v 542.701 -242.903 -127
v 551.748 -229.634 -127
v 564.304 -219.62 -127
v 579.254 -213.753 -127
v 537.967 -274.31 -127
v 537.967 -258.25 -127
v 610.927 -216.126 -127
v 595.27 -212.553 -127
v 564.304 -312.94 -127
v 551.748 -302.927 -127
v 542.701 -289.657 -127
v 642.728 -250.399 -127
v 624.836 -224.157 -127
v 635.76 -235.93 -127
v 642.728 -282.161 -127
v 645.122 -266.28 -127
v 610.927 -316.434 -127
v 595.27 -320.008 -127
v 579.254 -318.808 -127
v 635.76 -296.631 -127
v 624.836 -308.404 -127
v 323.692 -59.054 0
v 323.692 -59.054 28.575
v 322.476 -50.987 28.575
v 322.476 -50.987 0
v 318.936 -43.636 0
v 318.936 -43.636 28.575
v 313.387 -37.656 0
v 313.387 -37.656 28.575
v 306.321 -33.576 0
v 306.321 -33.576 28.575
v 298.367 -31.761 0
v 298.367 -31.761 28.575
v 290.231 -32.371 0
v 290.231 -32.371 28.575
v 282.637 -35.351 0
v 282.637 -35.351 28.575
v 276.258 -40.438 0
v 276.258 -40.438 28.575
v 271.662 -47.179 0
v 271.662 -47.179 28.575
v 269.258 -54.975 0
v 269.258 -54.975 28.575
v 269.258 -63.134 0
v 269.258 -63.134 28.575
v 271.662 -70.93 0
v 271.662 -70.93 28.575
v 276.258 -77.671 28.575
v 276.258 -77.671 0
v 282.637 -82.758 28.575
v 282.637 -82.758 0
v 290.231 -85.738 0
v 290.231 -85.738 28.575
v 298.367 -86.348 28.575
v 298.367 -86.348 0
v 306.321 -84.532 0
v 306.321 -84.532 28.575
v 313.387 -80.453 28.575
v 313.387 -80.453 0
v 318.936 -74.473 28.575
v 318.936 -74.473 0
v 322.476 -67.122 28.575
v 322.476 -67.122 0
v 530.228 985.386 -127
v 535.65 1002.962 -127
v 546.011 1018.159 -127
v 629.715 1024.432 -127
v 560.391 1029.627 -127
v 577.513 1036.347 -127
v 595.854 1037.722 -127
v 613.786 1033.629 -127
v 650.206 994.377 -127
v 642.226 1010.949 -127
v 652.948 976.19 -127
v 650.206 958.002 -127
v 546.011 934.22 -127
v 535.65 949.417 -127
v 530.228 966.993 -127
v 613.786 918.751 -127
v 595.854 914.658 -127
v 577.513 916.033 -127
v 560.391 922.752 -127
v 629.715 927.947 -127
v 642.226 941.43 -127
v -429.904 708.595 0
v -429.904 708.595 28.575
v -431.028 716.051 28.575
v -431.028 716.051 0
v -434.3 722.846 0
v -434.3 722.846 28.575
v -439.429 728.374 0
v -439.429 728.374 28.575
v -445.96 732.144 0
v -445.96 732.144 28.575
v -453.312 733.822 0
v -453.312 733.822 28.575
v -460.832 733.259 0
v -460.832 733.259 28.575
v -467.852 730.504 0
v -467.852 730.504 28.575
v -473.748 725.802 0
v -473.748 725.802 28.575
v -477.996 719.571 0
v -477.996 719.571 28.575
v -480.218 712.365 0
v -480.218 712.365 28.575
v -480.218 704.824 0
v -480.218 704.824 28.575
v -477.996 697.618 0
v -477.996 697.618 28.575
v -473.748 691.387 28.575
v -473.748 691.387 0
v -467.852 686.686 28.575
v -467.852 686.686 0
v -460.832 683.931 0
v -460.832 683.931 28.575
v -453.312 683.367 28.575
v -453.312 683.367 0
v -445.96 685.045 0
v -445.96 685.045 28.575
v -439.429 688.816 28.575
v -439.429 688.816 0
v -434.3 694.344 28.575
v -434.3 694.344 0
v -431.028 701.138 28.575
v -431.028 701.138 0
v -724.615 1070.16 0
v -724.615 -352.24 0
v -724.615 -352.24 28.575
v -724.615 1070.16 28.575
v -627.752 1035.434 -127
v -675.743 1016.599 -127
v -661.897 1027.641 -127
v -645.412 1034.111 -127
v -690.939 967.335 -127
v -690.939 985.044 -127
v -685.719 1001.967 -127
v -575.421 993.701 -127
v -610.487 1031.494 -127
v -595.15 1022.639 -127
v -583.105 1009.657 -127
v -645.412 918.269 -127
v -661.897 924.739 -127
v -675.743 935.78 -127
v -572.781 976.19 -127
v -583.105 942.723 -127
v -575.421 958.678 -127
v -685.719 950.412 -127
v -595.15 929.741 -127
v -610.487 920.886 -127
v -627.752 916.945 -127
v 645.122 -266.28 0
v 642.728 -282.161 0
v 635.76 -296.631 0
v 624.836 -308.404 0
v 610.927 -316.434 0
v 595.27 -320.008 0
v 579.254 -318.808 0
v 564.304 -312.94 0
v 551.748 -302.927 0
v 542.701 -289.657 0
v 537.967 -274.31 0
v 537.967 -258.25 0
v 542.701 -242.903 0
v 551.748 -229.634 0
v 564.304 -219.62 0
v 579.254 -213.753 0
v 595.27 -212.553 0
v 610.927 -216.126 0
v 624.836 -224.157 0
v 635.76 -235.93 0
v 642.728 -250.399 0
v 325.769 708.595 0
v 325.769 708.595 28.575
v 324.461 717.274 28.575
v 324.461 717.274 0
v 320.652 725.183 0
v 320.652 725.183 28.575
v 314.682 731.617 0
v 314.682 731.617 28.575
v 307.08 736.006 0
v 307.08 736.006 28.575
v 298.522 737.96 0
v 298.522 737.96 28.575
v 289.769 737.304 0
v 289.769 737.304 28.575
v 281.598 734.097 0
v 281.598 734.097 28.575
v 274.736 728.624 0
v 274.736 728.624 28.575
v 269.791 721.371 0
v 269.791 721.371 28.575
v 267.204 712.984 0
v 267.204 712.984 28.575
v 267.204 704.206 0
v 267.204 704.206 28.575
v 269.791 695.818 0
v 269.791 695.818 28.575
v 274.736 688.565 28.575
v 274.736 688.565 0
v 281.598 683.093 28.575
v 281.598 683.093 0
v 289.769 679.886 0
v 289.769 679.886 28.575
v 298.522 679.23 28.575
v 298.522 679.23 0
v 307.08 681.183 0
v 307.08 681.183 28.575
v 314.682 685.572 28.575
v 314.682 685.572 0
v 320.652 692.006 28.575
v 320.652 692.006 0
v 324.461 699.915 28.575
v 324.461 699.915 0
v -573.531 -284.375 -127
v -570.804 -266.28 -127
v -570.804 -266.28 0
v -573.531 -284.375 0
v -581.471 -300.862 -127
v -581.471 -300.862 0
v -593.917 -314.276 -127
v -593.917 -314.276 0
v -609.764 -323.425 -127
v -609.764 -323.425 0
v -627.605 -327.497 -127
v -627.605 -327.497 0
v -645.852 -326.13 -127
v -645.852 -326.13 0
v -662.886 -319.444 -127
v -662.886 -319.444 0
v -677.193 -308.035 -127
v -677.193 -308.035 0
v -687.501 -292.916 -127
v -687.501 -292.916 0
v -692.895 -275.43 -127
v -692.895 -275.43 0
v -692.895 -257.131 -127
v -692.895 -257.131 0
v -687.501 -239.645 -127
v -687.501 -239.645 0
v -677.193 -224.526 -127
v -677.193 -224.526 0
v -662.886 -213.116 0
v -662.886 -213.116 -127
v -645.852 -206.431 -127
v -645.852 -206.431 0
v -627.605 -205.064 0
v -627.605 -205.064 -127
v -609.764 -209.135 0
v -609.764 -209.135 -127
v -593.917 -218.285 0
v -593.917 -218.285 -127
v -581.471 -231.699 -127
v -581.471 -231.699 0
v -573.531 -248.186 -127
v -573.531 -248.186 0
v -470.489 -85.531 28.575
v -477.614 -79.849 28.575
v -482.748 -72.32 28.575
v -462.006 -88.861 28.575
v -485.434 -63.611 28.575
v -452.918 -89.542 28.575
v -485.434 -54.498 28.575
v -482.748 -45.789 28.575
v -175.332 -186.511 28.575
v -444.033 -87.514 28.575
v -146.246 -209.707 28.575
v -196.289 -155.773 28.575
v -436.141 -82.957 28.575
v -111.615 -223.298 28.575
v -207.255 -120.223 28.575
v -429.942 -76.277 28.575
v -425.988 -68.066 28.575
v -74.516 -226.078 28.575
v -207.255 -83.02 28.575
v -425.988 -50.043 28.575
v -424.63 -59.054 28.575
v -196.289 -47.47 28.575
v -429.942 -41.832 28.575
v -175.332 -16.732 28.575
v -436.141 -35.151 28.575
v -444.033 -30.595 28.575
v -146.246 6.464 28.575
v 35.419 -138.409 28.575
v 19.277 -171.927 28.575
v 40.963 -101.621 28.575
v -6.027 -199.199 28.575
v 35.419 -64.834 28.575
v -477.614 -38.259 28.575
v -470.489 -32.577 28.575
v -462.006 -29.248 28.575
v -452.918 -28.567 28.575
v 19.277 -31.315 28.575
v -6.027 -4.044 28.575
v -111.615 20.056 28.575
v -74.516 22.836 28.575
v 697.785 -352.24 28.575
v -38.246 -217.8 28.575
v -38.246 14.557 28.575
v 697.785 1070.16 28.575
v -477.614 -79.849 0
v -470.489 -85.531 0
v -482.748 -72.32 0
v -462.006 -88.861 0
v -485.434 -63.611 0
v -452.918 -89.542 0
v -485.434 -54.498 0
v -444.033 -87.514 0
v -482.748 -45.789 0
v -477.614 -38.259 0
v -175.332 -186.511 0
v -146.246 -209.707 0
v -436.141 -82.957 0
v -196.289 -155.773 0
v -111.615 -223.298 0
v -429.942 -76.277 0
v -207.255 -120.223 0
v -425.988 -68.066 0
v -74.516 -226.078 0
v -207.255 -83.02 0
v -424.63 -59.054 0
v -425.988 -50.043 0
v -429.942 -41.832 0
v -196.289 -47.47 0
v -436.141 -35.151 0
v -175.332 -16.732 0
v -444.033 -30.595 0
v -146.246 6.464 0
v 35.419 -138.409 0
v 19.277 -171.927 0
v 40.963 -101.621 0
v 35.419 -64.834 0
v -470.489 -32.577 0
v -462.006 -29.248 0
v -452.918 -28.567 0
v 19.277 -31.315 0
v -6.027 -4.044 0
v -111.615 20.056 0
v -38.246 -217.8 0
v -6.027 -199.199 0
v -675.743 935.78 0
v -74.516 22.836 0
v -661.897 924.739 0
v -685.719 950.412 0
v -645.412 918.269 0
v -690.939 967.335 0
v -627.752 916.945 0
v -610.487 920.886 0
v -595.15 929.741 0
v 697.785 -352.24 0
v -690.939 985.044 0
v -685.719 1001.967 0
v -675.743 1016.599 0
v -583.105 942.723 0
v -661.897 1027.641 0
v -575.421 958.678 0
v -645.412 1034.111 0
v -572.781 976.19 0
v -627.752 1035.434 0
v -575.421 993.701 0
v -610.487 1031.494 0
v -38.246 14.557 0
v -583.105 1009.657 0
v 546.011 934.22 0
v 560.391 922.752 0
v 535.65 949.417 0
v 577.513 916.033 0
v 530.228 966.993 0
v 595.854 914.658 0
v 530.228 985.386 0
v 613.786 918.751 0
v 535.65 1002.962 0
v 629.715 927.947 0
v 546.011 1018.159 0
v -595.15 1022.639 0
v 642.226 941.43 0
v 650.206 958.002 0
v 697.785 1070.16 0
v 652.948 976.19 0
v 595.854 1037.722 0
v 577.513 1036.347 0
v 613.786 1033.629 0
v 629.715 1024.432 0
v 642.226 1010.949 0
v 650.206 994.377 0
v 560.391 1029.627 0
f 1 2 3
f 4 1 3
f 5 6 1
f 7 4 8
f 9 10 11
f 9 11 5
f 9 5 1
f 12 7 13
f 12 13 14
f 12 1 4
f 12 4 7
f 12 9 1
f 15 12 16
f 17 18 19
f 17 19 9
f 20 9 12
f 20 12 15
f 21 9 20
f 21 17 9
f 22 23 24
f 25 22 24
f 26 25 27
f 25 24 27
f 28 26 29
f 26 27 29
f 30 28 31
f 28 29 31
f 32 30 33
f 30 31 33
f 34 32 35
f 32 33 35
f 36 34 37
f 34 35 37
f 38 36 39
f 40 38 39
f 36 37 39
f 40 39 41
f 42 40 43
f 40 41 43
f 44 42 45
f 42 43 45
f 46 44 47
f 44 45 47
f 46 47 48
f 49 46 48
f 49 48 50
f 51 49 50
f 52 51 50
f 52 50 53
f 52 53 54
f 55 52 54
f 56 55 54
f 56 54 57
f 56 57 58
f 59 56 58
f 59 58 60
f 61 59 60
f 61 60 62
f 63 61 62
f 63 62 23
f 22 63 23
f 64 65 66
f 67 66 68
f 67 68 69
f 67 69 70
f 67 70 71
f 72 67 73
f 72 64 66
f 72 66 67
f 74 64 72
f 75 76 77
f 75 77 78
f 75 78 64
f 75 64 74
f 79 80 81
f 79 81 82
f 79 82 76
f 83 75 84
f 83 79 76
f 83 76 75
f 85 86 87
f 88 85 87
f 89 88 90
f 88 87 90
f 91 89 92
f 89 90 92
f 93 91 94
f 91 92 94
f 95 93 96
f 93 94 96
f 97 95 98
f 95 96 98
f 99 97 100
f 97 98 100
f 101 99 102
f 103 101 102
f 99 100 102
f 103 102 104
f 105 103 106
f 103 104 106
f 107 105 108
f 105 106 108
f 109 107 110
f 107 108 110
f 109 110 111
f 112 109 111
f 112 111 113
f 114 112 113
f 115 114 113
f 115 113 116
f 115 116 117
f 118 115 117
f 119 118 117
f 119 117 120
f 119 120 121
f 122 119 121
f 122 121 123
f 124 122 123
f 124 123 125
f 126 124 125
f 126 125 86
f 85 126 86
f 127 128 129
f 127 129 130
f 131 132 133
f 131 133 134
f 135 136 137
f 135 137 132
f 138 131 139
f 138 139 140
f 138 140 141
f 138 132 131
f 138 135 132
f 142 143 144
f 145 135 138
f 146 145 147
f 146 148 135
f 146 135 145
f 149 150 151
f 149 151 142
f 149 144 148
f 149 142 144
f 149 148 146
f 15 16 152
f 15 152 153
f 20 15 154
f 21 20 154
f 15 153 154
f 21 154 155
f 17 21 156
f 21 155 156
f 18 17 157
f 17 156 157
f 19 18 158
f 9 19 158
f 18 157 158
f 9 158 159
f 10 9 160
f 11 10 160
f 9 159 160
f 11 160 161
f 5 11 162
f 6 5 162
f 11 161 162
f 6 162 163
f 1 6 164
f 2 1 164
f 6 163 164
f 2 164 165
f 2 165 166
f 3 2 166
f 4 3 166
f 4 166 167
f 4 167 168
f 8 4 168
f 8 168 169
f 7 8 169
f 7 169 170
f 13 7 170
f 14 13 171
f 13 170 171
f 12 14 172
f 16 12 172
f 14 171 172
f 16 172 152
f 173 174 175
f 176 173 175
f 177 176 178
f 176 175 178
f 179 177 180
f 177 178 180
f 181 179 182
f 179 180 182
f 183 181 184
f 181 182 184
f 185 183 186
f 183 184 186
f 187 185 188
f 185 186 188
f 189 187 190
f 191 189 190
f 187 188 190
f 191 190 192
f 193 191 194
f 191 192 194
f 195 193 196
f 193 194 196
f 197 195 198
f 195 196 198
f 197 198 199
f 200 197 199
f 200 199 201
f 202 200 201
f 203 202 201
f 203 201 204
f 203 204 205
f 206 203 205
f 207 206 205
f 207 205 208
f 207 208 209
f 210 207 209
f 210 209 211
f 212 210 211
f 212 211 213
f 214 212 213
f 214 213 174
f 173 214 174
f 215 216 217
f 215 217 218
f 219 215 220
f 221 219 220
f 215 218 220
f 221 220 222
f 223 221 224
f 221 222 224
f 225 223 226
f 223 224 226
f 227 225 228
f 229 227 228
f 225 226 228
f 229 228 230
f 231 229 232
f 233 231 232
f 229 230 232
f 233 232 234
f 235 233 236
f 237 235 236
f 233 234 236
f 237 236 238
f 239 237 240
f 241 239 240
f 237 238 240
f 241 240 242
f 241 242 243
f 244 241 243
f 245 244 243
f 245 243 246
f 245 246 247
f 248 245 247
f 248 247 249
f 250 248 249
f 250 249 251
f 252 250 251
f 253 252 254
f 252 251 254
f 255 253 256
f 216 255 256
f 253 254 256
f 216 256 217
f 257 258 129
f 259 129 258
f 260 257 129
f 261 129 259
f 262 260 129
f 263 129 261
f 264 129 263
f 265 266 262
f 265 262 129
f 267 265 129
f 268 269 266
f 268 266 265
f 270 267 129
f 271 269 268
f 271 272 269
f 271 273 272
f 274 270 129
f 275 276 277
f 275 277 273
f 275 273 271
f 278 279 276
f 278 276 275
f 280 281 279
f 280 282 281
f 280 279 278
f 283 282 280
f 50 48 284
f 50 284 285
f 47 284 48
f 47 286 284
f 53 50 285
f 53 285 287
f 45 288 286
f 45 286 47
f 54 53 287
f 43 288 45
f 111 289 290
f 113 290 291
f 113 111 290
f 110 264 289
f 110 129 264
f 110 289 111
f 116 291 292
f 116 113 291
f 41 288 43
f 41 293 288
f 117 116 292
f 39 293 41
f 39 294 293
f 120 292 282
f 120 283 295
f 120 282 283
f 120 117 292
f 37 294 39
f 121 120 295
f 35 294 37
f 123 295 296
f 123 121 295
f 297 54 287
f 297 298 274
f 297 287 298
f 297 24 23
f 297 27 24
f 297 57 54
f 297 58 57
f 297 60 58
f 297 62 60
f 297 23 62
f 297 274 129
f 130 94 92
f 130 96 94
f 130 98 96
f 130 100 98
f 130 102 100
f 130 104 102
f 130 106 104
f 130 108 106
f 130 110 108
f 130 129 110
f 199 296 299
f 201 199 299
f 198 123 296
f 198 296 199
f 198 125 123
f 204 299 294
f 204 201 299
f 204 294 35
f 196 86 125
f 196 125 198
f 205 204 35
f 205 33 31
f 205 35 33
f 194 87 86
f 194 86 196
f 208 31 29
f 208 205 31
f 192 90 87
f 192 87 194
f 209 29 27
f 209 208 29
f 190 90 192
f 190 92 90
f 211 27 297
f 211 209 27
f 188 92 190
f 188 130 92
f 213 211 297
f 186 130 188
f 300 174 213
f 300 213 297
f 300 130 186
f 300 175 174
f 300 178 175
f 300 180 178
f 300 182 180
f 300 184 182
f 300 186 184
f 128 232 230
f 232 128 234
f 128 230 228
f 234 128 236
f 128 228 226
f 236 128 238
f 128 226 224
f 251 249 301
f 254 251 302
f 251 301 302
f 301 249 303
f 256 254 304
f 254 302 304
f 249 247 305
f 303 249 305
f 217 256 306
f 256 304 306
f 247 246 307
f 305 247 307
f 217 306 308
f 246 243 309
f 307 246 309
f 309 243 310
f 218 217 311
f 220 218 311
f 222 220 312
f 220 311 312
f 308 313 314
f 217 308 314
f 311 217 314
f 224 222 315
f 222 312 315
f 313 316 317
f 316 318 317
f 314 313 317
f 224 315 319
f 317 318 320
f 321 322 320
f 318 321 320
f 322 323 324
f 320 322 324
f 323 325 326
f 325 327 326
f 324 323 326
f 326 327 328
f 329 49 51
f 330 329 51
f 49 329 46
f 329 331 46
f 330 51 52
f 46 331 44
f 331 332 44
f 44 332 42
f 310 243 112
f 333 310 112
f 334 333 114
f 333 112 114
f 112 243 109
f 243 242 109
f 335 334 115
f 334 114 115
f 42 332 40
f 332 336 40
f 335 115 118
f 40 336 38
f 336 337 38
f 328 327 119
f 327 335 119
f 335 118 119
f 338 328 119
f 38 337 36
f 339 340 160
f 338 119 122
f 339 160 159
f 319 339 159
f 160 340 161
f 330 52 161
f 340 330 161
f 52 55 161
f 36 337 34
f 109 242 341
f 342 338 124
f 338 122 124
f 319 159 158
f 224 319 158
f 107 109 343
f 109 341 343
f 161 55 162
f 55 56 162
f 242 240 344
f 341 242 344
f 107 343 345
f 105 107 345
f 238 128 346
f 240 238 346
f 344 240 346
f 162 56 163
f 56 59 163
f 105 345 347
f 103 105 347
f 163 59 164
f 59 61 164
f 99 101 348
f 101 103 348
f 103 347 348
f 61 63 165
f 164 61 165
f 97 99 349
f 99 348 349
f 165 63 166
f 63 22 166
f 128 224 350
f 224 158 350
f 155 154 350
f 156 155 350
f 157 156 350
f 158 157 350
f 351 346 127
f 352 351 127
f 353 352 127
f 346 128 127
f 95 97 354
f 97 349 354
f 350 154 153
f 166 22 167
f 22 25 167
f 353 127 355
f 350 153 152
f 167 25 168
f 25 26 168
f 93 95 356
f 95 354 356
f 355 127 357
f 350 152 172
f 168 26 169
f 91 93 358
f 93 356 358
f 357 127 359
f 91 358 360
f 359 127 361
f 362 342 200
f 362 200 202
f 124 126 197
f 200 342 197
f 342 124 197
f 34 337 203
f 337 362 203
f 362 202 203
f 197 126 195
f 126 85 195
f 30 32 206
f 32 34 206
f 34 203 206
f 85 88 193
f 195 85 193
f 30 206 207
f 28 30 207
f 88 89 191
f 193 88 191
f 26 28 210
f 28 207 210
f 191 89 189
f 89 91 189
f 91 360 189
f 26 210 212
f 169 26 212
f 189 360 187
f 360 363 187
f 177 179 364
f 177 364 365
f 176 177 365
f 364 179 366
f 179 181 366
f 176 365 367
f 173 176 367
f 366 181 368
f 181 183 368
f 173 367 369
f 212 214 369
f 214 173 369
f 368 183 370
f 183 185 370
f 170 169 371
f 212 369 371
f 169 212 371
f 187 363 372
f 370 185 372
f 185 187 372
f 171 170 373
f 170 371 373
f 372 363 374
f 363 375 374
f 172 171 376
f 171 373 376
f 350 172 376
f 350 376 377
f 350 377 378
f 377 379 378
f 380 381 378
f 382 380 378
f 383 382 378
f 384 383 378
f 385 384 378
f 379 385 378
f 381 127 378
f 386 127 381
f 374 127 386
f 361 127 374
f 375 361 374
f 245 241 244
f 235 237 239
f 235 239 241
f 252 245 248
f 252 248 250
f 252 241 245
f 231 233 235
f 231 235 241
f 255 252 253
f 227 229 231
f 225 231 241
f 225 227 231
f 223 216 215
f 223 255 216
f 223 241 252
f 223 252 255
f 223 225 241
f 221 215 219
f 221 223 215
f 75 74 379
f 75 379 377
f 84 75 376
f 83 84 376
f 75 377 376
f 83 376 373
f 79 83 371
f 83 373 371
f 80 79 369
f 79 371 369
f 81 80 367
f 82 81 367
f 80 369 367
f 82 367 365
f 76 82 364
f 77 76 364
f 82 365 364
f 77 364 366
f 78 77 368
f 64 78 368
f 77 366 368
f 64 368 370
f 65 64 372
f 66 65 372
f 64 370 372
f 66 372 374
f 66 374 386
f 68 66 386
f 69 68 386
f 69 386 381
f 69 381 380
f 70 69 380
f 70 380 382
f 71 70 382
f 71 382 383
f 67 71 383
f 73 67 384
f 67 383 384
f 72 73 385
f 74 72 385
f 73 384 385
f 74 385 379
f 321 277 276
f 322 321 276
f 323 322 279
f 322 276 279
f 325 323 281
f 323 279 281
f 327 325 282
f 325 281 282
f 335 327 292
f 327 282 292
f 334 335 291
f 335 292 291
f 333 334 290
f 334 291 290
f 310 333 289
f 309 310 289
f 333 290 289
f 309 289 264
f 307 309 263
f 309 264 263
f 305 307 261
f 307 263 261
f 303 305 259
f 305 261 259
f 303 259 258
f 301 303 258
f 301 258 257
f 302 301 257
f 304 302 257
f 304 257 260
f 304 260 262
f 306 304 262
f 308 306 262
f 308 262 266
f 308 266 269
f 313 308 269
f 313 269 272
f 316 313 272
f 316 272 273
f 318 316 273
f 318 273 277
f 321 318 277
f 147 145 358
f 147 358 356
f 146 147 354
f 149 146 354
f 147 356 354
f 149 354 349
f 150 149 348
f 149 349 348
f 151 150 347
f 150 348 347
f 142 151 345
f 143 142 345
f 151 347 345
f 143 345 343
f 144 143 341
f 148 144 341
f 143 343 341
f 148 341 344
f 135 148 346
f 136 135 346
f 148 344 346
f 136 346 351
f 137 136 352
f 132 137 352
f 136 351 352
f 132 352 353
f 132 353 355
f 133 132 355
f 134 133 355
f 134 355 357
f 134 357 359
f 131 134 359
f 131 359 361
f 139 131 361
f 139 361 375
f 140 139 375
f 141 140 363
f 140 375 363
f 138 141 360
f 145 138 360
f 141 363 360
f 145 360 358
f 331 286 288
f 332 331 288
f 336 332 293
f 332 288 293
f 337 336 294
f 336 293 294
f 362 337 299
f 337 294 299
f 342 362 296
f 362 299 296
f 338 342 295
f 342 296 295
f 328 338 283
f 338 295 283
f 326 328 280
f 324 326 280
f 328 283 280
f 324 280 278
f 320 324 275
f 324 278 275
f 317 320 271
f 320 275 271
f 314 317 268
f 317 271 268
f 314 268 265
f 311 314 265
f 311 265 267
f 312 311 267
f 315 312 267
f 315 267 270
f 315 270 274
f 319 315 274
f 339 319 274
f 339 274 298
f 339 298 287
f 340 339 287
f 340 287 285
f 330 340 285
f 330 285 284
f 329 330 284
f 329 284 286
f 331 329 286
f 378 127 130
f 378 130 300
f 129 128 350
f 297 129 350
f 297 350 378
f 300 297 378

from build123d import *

# Parameters (mm, degrees)
F0_W     = 1422.4
F0_H     = 1422.4
F1_DEPTH = 28.575
F2_R     = 53.878299
F2_R_2   = 61.704348
F2_R_3   = 59.410664
F2_R_4   = 61.388417
F3_DEPTH = 127
F4_R     = 29.44728
F4_R_2   = 25.298259
F4_R_3   = 30.573071
F4_R_4   = 27.370078
F5_DEPTH = 428.45566
F6_R     = 124.806137
F7_DEPTH = 511.49744


with BuildPart() as f1:
    # F0 (on Top) → F1 (new body)
    with BuildSketch(Plane.XY):
        with Locations((-13.414681, 358.960475)):
            Rectangle(F0_W, F0_H)
    extrude(amount=F1_DEPTH)

    # F2 (on face) → F3 (join)
    with BuildSketch(Plane(origin=(0, 0, 0), x_dir=(1, 0, 0), z_dir=(0, 0, -1))):
        with Locations((591.243267, 266.280264)):
            Circle(F2_R)
        with Locations((591.243267, -976.189792)):
            Circle(F2_R_2)
        with Locations((-632.192075, -976.189792)):
            Circle(F2_R_3)
        with Locations((-632.192075, 266.280264)):
            Circle(F2_R_4)
    extrude(amount=F3_DEPTH)

    # F4 (on face) → F5 (cut)
    with BuildSketch(Plane.XY.offset(28.575)):
        with Locations((296.321899, 708.59462)):
            Circle(F4_R)
        with Locations((-455.202579, 708.59462)):
            Circle(F4_R_2)
        with Locations((-455.202579, -59.054408)):
            Circle(F4_R_3)
        with Locations((296.321899, -59.054408)):
            Circle(F4_R_4)
    extrude(amount=-F5_DEPTH, mode=Mode.SUBTRACT)

    # F6 (on face) → F7 (cut)
    with BuildSketch(Plane.XY.offset(28.575)):
        with Locations((-83.842769, -101.621295)):
            Circle(F6_R)
    extrude(amount=-F7_DEPTH, mode=Mode.SUBTRACT)


solid = f1.part
